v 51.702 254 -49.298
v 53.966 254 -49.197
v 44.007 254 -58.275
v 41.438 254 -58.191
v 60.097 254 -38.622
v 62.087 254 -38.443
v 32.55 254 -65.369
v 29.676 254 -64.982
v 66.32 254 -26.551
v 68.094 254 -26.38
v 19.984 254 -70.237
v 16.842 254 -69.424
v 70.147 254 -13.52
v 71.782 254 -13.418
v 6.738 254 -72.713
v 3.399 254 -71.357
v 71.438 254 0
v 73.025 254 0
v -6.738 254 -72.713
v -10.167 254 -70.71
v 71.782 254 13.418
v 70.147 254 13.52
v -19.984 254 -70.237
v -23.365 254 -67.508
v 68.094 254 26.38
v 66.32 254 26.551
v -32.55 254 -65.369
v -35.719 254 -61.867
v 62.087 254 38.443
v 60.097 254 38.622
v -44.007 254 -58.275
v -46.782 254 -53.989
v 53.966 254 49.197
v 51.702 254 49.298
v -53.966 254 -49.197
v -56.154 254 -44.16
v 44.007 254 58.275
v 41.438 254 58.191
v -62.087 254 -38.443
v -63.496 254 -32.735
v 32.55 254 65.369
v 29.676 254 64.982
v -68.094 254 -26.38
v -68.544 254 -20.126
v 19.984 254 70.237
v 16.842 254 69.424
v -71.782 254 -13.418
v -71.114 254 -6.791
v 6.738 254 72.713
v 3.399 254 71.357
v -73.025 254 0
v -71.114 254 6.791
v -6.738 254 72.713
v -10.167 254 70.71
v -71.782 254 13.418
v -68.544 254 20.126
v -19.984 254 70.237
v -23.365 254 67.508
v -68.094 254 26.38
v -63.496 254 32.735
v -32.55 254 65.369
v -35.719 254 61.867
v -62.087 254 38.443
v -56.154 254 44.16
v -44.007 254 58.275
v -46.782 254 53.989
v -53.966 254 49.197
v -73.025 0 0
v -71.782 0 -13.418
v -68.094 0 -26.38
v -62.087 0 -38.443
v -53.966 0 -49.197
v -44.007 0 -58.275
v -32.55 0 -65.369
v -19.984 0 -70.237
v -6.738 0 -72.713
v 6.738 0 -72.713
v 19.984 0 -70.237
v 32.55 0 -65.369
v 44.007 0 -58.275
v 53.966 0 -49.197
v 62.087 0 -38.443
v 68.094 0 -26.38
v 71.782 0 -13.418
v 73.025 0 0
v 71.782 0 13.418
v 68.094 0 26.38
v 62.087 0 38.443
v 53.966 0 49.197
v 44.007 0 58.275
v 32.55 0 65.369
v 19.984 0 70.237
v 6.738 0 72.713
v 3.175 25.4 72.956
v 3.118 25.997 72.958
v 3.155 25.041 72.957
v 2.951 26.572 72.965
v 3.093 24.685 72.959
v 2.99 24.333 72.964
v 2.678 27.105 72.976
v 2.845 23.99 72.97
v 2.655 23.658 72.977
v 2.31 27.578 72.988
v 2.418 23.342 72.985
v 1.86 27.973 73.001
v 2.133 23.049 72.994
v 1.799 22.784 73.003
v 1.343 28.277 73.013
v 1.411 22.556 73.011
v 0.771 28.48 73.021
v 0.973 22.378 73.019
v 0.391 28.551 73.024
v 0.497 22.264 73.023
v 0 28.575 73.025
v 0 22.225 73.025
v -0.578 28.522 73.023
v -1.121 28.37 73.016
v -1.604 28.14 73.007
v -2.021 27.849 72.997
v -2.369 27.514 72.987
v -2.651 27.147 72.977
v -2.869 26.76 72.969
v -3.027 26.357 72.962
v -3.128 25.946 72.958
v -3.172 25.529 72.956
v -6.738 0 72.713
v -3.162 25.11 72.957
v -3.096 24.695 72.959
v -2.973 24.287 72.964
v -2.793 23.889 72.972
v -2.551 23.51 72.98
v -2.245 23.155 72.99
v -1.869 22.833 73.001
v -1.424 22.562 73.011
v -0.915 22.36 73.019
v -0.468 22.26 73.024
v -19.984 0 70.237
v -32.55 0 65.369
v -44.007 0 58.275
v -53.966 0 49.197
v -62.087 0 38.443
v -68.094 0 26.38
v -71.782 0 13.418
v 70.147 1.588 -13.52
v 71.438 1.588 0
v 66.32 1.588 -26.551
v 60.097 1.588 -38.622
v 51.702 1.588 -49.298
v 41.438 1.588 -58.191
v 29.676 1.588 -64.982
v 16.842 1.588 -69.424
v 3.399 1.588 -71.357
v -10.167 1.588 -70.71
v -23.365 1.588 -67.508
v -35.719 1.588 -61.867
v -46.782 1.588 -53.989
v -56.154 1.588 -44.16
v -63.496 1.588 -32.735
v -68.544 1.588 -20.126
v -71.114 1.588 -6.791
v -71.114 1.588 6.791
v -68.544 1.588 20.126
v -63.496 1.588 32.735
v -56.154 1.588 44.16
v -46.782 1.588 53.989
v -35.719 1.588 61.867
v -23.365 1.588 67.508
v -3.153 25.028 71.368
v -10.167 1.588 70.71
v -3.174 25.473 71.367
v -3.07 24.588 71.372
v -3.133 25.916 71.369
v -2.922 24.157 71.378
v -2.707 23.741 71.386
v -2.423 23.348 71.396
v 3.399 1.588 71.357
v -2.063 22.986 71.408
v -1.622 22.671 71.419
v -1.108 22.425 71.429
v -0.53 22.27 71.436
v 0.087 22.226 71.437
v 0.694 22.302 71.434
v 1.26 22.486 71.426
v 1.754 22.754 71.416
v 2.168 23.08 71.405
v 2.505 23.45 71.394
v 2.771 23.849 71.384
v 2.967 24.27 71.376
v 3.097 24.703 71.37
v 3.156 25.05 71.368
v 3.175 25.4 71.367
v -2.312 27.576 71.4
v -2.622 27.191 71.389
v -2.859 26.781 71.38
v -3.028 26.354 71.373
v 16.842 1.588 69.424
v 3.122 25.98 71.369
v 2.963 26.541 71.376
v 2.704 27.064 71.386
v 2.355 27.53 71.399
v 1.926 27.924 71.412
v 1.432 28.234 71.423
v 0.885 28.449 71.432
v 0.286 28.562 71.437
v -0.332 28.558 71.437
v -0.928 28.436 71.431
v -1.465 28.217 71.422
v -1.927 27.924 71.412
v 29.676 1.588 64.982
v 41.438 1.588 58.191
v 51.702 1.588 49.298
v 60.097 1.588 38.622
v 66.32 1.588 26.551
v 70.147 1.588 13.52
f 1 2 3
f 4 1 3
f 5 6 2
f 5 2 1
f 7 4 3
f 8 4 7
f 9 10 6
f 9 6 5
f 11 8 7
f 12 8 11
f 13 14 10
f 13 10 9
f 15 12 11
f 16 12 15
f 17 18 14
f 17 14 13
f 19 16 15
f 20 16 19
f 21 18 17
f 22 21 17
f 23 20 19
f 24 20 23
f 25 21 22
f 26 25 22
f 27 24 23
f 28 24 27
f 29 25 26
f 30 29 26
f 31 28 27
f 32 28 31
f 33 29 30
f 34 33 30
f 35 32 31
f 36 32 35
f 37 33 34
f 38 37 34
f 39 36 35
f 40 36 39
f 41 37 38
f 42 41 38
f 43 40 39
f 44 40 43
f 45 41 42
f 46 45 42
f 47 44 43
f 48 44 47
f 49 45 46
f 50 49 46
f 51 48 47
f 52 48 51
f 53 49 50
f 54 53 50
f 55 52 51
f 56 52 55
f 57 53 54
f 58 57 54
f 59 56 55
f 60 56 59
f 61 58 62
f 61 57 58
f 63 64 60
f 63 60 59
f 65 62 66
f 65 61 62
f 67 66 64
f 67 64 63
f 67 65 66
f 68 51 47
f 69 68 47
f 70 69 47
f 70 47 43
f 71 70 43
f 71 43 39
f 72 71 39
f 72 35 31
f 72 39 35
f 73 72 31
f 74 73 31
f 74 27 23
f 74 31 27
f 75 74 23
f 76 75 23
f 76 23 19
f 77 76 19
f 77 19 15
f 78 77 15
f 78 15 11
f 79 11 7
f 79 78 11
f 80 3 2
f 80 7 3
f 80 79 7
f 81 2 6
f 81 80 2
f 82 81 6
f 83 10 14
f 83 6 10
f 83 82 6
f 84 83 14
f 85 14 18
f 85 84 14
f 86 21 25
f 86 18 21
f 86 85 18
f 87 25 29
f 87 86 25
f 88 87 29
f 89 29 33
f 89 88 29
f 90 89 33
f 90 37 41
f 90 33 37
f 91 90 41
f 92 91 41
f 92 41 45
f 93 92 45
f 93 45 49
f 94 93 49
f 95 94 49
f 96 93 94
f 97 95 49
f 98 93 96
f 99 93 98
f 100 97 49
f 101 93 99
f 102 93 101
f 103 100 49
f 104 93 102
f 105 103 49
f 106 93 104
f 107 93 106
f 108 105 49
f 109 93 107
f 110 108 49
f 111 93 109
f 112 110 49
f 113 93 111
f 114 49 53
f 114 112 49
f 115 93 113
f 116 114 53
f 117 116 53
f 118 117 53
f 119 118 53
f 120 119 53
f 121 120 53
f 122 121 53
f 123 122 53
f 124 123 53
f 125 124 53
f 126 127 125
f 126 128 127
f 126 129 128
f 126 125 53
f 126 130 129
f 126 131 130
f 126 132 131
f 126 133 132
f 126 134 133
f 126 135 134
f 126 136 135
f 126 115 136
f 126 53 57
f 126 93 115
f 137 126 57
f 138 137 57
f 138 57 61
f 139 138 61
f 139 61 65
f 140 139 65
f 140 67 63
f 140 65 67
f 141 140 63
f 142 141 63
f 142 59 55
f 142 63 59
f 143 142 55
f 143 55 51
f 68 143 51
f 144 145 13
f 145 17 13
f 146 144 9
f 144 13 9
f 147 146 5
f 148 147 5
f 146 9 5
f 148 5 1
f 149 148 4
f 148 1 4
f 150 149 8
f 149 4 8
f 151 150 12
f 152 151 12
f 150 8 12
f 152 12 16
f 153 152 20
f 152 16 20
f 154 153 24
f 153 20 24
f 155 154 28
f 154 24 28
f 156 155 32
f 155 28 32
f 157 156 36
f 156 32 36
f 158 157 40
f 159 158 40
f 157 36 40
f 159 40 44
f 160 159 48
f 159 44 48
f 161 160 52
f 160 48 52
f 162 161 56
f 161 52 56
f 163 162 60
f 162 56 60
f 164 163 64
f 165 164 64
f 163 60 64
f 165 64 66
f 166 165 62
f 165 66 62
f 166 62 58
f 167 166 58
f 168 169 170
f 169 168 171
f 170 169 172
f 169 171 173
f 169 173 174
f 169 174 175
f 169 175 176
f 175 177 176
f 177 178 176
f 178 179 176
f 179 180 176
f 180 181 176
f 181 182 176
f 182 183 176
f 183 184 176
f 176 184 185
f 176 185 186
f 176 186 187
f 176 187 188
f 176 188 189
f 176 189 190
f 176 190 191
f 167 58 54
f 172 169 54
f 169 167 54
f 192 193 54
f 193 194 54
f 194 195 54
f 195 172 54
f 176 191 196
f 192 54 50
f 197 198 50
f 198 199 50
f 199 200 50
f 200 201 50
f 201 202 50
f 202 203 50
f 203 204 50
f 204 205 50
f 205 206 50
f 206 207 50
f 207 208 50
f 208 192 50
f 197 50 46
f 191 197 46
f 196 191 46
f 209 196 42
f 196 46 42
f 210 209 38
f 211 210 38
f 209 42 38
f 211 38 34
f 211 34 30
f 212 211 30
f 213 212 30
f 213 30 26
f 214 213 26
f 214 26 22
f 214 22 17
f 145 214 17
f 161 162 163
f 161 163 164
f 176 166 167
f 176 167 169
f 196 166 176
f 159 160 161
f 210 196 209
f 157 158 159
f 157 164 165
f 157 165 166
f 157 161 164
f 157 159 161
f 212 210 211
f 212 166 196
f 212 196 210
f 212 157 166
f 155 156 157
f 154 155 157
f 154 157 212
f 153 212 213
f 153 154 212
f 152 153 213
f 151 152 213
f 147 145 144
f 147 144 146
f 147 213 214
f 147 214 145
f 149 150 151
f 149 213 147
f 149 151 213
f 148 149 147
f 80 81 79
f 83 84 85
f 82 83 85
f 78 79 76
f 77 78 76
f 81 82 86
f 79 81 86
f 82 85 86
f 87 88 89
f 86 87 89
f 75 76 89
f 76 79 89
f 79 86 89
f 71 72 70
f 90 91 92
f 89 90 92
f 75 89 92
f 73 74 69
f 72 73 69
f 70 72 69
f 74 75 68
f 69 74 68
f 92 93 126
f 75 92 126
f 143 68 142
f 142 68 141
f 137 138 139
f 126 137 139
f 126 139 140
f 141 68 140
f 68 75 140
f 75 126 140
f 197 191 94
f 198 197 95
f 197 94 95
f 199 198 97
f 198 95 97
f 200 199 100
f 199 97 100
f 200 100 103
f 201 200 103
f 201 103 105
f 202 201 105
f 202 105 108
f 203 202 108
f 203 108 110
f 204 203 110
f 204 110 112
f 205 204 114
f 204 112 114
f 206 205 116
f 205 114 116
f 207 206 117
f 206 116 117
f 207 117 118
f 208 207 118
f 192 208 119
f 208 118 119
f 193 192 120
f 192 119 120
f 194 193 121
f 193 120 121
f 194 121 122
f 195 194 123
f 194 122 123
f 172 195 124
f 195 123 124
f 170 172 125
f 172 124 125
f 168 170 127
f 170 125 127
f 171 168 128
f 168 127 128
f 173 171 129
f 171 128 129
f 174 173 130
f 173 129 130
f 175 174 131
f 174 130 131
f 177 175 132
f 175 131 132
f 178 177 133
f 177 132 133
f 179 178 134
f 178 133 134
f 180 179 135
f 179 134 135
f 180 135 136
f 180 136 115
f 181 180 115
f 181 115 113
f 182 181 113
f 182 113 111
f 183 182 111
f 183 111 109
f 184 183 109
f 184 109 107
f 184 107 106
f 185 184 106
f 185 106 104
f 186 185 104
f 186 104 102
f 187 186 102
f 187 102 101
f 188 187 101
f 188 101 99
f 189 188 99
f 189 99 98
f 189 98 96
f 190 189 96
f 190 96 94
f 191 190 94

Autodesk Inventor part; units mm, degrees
ref_plane "YZ Plane" through (0, 0, 0) normal (1, 0, 0) x (0, 1, 0)
ref_plane "XZ Plane" through (0, 0, 0) normal (0, 1, 0) x (-1, 0, 0)
ref_plane "XY Plane" through (0, 0, 0) normal (0, 0, 1) x (1, 0, 0)
sketch "Sketch1" plane through (0, 0, 0) normal (0, 1, 0) x (-1, 0, 0)
  circle A0 centre (0, 0) radius 73.025
  dimension "d0" = 146.05
extrude "Extrusion1" add sketch "Sketch1" along normal blind 254
sketch "Sketch2" plane through (0, 254, 0) normal (0, 1, 0) x (1, 0, 0)
  circle A0 centre (0, 0) radius 73.025 projected
  circle A1 centre (0, 0) radius 71.4375
  dimension "d3" = 1.5875
extrude "Extrusion2" cut sketch "Sketch2" against normal blind 252.4125 contours A1
sketch "Sketch3" plane through (0, 0, 0) normal (0, -1, 0) x (1, 0, 0)
  circle A0 centre (0, 0) radius 73.025 projected
  point P0 (0, 73.025)
ref_plane "Work Plane1" through (0, 0, 73.025) normal (0, 0, 1) x (1, 0, 0)
sketch "Sketch4" plane through (0, 0, 73.025) normal (0, 0, 1) x (1, 0, 0)
  circle A0 centre (0, 25.4) radius 3.175
  point P0 (0, 0)
  dimension "d6" = 6.35
  dimension "d7" = 25.4
extrude "Extrusion3" cut sketch "Sketch4" against normal blind 25.4
sketch "Sketch5" plane through (0, 1.5875, 0) normal (0, 1, 0) x (1, 0, 0)
  circle A0 centre (0, 0) radius 71.4375 projected
  point P0 (0, -71.4375)
ref_plane "Work Plane2" through (0, 1.5875, 71.4375) normal (0, 0, 1) x (1, 0, 0)
sketch "Sketch6" plane through (0, 1.5875, 71.4375) normal (0, 0, 1) x (1, 0, 0)
  line L0 (-71.4375, 0) -> (71.4375, 0) projected
  line L1 (-71.4375, 252.4125) -> (71.4375, 252.4125) projected
  point P0 (0, -1.5875)
  point P1 (3.175, 23.8125)
  point P2 (0, 23.8125)
properties part number "Water Jug" material "PC/ABS Plastic"
